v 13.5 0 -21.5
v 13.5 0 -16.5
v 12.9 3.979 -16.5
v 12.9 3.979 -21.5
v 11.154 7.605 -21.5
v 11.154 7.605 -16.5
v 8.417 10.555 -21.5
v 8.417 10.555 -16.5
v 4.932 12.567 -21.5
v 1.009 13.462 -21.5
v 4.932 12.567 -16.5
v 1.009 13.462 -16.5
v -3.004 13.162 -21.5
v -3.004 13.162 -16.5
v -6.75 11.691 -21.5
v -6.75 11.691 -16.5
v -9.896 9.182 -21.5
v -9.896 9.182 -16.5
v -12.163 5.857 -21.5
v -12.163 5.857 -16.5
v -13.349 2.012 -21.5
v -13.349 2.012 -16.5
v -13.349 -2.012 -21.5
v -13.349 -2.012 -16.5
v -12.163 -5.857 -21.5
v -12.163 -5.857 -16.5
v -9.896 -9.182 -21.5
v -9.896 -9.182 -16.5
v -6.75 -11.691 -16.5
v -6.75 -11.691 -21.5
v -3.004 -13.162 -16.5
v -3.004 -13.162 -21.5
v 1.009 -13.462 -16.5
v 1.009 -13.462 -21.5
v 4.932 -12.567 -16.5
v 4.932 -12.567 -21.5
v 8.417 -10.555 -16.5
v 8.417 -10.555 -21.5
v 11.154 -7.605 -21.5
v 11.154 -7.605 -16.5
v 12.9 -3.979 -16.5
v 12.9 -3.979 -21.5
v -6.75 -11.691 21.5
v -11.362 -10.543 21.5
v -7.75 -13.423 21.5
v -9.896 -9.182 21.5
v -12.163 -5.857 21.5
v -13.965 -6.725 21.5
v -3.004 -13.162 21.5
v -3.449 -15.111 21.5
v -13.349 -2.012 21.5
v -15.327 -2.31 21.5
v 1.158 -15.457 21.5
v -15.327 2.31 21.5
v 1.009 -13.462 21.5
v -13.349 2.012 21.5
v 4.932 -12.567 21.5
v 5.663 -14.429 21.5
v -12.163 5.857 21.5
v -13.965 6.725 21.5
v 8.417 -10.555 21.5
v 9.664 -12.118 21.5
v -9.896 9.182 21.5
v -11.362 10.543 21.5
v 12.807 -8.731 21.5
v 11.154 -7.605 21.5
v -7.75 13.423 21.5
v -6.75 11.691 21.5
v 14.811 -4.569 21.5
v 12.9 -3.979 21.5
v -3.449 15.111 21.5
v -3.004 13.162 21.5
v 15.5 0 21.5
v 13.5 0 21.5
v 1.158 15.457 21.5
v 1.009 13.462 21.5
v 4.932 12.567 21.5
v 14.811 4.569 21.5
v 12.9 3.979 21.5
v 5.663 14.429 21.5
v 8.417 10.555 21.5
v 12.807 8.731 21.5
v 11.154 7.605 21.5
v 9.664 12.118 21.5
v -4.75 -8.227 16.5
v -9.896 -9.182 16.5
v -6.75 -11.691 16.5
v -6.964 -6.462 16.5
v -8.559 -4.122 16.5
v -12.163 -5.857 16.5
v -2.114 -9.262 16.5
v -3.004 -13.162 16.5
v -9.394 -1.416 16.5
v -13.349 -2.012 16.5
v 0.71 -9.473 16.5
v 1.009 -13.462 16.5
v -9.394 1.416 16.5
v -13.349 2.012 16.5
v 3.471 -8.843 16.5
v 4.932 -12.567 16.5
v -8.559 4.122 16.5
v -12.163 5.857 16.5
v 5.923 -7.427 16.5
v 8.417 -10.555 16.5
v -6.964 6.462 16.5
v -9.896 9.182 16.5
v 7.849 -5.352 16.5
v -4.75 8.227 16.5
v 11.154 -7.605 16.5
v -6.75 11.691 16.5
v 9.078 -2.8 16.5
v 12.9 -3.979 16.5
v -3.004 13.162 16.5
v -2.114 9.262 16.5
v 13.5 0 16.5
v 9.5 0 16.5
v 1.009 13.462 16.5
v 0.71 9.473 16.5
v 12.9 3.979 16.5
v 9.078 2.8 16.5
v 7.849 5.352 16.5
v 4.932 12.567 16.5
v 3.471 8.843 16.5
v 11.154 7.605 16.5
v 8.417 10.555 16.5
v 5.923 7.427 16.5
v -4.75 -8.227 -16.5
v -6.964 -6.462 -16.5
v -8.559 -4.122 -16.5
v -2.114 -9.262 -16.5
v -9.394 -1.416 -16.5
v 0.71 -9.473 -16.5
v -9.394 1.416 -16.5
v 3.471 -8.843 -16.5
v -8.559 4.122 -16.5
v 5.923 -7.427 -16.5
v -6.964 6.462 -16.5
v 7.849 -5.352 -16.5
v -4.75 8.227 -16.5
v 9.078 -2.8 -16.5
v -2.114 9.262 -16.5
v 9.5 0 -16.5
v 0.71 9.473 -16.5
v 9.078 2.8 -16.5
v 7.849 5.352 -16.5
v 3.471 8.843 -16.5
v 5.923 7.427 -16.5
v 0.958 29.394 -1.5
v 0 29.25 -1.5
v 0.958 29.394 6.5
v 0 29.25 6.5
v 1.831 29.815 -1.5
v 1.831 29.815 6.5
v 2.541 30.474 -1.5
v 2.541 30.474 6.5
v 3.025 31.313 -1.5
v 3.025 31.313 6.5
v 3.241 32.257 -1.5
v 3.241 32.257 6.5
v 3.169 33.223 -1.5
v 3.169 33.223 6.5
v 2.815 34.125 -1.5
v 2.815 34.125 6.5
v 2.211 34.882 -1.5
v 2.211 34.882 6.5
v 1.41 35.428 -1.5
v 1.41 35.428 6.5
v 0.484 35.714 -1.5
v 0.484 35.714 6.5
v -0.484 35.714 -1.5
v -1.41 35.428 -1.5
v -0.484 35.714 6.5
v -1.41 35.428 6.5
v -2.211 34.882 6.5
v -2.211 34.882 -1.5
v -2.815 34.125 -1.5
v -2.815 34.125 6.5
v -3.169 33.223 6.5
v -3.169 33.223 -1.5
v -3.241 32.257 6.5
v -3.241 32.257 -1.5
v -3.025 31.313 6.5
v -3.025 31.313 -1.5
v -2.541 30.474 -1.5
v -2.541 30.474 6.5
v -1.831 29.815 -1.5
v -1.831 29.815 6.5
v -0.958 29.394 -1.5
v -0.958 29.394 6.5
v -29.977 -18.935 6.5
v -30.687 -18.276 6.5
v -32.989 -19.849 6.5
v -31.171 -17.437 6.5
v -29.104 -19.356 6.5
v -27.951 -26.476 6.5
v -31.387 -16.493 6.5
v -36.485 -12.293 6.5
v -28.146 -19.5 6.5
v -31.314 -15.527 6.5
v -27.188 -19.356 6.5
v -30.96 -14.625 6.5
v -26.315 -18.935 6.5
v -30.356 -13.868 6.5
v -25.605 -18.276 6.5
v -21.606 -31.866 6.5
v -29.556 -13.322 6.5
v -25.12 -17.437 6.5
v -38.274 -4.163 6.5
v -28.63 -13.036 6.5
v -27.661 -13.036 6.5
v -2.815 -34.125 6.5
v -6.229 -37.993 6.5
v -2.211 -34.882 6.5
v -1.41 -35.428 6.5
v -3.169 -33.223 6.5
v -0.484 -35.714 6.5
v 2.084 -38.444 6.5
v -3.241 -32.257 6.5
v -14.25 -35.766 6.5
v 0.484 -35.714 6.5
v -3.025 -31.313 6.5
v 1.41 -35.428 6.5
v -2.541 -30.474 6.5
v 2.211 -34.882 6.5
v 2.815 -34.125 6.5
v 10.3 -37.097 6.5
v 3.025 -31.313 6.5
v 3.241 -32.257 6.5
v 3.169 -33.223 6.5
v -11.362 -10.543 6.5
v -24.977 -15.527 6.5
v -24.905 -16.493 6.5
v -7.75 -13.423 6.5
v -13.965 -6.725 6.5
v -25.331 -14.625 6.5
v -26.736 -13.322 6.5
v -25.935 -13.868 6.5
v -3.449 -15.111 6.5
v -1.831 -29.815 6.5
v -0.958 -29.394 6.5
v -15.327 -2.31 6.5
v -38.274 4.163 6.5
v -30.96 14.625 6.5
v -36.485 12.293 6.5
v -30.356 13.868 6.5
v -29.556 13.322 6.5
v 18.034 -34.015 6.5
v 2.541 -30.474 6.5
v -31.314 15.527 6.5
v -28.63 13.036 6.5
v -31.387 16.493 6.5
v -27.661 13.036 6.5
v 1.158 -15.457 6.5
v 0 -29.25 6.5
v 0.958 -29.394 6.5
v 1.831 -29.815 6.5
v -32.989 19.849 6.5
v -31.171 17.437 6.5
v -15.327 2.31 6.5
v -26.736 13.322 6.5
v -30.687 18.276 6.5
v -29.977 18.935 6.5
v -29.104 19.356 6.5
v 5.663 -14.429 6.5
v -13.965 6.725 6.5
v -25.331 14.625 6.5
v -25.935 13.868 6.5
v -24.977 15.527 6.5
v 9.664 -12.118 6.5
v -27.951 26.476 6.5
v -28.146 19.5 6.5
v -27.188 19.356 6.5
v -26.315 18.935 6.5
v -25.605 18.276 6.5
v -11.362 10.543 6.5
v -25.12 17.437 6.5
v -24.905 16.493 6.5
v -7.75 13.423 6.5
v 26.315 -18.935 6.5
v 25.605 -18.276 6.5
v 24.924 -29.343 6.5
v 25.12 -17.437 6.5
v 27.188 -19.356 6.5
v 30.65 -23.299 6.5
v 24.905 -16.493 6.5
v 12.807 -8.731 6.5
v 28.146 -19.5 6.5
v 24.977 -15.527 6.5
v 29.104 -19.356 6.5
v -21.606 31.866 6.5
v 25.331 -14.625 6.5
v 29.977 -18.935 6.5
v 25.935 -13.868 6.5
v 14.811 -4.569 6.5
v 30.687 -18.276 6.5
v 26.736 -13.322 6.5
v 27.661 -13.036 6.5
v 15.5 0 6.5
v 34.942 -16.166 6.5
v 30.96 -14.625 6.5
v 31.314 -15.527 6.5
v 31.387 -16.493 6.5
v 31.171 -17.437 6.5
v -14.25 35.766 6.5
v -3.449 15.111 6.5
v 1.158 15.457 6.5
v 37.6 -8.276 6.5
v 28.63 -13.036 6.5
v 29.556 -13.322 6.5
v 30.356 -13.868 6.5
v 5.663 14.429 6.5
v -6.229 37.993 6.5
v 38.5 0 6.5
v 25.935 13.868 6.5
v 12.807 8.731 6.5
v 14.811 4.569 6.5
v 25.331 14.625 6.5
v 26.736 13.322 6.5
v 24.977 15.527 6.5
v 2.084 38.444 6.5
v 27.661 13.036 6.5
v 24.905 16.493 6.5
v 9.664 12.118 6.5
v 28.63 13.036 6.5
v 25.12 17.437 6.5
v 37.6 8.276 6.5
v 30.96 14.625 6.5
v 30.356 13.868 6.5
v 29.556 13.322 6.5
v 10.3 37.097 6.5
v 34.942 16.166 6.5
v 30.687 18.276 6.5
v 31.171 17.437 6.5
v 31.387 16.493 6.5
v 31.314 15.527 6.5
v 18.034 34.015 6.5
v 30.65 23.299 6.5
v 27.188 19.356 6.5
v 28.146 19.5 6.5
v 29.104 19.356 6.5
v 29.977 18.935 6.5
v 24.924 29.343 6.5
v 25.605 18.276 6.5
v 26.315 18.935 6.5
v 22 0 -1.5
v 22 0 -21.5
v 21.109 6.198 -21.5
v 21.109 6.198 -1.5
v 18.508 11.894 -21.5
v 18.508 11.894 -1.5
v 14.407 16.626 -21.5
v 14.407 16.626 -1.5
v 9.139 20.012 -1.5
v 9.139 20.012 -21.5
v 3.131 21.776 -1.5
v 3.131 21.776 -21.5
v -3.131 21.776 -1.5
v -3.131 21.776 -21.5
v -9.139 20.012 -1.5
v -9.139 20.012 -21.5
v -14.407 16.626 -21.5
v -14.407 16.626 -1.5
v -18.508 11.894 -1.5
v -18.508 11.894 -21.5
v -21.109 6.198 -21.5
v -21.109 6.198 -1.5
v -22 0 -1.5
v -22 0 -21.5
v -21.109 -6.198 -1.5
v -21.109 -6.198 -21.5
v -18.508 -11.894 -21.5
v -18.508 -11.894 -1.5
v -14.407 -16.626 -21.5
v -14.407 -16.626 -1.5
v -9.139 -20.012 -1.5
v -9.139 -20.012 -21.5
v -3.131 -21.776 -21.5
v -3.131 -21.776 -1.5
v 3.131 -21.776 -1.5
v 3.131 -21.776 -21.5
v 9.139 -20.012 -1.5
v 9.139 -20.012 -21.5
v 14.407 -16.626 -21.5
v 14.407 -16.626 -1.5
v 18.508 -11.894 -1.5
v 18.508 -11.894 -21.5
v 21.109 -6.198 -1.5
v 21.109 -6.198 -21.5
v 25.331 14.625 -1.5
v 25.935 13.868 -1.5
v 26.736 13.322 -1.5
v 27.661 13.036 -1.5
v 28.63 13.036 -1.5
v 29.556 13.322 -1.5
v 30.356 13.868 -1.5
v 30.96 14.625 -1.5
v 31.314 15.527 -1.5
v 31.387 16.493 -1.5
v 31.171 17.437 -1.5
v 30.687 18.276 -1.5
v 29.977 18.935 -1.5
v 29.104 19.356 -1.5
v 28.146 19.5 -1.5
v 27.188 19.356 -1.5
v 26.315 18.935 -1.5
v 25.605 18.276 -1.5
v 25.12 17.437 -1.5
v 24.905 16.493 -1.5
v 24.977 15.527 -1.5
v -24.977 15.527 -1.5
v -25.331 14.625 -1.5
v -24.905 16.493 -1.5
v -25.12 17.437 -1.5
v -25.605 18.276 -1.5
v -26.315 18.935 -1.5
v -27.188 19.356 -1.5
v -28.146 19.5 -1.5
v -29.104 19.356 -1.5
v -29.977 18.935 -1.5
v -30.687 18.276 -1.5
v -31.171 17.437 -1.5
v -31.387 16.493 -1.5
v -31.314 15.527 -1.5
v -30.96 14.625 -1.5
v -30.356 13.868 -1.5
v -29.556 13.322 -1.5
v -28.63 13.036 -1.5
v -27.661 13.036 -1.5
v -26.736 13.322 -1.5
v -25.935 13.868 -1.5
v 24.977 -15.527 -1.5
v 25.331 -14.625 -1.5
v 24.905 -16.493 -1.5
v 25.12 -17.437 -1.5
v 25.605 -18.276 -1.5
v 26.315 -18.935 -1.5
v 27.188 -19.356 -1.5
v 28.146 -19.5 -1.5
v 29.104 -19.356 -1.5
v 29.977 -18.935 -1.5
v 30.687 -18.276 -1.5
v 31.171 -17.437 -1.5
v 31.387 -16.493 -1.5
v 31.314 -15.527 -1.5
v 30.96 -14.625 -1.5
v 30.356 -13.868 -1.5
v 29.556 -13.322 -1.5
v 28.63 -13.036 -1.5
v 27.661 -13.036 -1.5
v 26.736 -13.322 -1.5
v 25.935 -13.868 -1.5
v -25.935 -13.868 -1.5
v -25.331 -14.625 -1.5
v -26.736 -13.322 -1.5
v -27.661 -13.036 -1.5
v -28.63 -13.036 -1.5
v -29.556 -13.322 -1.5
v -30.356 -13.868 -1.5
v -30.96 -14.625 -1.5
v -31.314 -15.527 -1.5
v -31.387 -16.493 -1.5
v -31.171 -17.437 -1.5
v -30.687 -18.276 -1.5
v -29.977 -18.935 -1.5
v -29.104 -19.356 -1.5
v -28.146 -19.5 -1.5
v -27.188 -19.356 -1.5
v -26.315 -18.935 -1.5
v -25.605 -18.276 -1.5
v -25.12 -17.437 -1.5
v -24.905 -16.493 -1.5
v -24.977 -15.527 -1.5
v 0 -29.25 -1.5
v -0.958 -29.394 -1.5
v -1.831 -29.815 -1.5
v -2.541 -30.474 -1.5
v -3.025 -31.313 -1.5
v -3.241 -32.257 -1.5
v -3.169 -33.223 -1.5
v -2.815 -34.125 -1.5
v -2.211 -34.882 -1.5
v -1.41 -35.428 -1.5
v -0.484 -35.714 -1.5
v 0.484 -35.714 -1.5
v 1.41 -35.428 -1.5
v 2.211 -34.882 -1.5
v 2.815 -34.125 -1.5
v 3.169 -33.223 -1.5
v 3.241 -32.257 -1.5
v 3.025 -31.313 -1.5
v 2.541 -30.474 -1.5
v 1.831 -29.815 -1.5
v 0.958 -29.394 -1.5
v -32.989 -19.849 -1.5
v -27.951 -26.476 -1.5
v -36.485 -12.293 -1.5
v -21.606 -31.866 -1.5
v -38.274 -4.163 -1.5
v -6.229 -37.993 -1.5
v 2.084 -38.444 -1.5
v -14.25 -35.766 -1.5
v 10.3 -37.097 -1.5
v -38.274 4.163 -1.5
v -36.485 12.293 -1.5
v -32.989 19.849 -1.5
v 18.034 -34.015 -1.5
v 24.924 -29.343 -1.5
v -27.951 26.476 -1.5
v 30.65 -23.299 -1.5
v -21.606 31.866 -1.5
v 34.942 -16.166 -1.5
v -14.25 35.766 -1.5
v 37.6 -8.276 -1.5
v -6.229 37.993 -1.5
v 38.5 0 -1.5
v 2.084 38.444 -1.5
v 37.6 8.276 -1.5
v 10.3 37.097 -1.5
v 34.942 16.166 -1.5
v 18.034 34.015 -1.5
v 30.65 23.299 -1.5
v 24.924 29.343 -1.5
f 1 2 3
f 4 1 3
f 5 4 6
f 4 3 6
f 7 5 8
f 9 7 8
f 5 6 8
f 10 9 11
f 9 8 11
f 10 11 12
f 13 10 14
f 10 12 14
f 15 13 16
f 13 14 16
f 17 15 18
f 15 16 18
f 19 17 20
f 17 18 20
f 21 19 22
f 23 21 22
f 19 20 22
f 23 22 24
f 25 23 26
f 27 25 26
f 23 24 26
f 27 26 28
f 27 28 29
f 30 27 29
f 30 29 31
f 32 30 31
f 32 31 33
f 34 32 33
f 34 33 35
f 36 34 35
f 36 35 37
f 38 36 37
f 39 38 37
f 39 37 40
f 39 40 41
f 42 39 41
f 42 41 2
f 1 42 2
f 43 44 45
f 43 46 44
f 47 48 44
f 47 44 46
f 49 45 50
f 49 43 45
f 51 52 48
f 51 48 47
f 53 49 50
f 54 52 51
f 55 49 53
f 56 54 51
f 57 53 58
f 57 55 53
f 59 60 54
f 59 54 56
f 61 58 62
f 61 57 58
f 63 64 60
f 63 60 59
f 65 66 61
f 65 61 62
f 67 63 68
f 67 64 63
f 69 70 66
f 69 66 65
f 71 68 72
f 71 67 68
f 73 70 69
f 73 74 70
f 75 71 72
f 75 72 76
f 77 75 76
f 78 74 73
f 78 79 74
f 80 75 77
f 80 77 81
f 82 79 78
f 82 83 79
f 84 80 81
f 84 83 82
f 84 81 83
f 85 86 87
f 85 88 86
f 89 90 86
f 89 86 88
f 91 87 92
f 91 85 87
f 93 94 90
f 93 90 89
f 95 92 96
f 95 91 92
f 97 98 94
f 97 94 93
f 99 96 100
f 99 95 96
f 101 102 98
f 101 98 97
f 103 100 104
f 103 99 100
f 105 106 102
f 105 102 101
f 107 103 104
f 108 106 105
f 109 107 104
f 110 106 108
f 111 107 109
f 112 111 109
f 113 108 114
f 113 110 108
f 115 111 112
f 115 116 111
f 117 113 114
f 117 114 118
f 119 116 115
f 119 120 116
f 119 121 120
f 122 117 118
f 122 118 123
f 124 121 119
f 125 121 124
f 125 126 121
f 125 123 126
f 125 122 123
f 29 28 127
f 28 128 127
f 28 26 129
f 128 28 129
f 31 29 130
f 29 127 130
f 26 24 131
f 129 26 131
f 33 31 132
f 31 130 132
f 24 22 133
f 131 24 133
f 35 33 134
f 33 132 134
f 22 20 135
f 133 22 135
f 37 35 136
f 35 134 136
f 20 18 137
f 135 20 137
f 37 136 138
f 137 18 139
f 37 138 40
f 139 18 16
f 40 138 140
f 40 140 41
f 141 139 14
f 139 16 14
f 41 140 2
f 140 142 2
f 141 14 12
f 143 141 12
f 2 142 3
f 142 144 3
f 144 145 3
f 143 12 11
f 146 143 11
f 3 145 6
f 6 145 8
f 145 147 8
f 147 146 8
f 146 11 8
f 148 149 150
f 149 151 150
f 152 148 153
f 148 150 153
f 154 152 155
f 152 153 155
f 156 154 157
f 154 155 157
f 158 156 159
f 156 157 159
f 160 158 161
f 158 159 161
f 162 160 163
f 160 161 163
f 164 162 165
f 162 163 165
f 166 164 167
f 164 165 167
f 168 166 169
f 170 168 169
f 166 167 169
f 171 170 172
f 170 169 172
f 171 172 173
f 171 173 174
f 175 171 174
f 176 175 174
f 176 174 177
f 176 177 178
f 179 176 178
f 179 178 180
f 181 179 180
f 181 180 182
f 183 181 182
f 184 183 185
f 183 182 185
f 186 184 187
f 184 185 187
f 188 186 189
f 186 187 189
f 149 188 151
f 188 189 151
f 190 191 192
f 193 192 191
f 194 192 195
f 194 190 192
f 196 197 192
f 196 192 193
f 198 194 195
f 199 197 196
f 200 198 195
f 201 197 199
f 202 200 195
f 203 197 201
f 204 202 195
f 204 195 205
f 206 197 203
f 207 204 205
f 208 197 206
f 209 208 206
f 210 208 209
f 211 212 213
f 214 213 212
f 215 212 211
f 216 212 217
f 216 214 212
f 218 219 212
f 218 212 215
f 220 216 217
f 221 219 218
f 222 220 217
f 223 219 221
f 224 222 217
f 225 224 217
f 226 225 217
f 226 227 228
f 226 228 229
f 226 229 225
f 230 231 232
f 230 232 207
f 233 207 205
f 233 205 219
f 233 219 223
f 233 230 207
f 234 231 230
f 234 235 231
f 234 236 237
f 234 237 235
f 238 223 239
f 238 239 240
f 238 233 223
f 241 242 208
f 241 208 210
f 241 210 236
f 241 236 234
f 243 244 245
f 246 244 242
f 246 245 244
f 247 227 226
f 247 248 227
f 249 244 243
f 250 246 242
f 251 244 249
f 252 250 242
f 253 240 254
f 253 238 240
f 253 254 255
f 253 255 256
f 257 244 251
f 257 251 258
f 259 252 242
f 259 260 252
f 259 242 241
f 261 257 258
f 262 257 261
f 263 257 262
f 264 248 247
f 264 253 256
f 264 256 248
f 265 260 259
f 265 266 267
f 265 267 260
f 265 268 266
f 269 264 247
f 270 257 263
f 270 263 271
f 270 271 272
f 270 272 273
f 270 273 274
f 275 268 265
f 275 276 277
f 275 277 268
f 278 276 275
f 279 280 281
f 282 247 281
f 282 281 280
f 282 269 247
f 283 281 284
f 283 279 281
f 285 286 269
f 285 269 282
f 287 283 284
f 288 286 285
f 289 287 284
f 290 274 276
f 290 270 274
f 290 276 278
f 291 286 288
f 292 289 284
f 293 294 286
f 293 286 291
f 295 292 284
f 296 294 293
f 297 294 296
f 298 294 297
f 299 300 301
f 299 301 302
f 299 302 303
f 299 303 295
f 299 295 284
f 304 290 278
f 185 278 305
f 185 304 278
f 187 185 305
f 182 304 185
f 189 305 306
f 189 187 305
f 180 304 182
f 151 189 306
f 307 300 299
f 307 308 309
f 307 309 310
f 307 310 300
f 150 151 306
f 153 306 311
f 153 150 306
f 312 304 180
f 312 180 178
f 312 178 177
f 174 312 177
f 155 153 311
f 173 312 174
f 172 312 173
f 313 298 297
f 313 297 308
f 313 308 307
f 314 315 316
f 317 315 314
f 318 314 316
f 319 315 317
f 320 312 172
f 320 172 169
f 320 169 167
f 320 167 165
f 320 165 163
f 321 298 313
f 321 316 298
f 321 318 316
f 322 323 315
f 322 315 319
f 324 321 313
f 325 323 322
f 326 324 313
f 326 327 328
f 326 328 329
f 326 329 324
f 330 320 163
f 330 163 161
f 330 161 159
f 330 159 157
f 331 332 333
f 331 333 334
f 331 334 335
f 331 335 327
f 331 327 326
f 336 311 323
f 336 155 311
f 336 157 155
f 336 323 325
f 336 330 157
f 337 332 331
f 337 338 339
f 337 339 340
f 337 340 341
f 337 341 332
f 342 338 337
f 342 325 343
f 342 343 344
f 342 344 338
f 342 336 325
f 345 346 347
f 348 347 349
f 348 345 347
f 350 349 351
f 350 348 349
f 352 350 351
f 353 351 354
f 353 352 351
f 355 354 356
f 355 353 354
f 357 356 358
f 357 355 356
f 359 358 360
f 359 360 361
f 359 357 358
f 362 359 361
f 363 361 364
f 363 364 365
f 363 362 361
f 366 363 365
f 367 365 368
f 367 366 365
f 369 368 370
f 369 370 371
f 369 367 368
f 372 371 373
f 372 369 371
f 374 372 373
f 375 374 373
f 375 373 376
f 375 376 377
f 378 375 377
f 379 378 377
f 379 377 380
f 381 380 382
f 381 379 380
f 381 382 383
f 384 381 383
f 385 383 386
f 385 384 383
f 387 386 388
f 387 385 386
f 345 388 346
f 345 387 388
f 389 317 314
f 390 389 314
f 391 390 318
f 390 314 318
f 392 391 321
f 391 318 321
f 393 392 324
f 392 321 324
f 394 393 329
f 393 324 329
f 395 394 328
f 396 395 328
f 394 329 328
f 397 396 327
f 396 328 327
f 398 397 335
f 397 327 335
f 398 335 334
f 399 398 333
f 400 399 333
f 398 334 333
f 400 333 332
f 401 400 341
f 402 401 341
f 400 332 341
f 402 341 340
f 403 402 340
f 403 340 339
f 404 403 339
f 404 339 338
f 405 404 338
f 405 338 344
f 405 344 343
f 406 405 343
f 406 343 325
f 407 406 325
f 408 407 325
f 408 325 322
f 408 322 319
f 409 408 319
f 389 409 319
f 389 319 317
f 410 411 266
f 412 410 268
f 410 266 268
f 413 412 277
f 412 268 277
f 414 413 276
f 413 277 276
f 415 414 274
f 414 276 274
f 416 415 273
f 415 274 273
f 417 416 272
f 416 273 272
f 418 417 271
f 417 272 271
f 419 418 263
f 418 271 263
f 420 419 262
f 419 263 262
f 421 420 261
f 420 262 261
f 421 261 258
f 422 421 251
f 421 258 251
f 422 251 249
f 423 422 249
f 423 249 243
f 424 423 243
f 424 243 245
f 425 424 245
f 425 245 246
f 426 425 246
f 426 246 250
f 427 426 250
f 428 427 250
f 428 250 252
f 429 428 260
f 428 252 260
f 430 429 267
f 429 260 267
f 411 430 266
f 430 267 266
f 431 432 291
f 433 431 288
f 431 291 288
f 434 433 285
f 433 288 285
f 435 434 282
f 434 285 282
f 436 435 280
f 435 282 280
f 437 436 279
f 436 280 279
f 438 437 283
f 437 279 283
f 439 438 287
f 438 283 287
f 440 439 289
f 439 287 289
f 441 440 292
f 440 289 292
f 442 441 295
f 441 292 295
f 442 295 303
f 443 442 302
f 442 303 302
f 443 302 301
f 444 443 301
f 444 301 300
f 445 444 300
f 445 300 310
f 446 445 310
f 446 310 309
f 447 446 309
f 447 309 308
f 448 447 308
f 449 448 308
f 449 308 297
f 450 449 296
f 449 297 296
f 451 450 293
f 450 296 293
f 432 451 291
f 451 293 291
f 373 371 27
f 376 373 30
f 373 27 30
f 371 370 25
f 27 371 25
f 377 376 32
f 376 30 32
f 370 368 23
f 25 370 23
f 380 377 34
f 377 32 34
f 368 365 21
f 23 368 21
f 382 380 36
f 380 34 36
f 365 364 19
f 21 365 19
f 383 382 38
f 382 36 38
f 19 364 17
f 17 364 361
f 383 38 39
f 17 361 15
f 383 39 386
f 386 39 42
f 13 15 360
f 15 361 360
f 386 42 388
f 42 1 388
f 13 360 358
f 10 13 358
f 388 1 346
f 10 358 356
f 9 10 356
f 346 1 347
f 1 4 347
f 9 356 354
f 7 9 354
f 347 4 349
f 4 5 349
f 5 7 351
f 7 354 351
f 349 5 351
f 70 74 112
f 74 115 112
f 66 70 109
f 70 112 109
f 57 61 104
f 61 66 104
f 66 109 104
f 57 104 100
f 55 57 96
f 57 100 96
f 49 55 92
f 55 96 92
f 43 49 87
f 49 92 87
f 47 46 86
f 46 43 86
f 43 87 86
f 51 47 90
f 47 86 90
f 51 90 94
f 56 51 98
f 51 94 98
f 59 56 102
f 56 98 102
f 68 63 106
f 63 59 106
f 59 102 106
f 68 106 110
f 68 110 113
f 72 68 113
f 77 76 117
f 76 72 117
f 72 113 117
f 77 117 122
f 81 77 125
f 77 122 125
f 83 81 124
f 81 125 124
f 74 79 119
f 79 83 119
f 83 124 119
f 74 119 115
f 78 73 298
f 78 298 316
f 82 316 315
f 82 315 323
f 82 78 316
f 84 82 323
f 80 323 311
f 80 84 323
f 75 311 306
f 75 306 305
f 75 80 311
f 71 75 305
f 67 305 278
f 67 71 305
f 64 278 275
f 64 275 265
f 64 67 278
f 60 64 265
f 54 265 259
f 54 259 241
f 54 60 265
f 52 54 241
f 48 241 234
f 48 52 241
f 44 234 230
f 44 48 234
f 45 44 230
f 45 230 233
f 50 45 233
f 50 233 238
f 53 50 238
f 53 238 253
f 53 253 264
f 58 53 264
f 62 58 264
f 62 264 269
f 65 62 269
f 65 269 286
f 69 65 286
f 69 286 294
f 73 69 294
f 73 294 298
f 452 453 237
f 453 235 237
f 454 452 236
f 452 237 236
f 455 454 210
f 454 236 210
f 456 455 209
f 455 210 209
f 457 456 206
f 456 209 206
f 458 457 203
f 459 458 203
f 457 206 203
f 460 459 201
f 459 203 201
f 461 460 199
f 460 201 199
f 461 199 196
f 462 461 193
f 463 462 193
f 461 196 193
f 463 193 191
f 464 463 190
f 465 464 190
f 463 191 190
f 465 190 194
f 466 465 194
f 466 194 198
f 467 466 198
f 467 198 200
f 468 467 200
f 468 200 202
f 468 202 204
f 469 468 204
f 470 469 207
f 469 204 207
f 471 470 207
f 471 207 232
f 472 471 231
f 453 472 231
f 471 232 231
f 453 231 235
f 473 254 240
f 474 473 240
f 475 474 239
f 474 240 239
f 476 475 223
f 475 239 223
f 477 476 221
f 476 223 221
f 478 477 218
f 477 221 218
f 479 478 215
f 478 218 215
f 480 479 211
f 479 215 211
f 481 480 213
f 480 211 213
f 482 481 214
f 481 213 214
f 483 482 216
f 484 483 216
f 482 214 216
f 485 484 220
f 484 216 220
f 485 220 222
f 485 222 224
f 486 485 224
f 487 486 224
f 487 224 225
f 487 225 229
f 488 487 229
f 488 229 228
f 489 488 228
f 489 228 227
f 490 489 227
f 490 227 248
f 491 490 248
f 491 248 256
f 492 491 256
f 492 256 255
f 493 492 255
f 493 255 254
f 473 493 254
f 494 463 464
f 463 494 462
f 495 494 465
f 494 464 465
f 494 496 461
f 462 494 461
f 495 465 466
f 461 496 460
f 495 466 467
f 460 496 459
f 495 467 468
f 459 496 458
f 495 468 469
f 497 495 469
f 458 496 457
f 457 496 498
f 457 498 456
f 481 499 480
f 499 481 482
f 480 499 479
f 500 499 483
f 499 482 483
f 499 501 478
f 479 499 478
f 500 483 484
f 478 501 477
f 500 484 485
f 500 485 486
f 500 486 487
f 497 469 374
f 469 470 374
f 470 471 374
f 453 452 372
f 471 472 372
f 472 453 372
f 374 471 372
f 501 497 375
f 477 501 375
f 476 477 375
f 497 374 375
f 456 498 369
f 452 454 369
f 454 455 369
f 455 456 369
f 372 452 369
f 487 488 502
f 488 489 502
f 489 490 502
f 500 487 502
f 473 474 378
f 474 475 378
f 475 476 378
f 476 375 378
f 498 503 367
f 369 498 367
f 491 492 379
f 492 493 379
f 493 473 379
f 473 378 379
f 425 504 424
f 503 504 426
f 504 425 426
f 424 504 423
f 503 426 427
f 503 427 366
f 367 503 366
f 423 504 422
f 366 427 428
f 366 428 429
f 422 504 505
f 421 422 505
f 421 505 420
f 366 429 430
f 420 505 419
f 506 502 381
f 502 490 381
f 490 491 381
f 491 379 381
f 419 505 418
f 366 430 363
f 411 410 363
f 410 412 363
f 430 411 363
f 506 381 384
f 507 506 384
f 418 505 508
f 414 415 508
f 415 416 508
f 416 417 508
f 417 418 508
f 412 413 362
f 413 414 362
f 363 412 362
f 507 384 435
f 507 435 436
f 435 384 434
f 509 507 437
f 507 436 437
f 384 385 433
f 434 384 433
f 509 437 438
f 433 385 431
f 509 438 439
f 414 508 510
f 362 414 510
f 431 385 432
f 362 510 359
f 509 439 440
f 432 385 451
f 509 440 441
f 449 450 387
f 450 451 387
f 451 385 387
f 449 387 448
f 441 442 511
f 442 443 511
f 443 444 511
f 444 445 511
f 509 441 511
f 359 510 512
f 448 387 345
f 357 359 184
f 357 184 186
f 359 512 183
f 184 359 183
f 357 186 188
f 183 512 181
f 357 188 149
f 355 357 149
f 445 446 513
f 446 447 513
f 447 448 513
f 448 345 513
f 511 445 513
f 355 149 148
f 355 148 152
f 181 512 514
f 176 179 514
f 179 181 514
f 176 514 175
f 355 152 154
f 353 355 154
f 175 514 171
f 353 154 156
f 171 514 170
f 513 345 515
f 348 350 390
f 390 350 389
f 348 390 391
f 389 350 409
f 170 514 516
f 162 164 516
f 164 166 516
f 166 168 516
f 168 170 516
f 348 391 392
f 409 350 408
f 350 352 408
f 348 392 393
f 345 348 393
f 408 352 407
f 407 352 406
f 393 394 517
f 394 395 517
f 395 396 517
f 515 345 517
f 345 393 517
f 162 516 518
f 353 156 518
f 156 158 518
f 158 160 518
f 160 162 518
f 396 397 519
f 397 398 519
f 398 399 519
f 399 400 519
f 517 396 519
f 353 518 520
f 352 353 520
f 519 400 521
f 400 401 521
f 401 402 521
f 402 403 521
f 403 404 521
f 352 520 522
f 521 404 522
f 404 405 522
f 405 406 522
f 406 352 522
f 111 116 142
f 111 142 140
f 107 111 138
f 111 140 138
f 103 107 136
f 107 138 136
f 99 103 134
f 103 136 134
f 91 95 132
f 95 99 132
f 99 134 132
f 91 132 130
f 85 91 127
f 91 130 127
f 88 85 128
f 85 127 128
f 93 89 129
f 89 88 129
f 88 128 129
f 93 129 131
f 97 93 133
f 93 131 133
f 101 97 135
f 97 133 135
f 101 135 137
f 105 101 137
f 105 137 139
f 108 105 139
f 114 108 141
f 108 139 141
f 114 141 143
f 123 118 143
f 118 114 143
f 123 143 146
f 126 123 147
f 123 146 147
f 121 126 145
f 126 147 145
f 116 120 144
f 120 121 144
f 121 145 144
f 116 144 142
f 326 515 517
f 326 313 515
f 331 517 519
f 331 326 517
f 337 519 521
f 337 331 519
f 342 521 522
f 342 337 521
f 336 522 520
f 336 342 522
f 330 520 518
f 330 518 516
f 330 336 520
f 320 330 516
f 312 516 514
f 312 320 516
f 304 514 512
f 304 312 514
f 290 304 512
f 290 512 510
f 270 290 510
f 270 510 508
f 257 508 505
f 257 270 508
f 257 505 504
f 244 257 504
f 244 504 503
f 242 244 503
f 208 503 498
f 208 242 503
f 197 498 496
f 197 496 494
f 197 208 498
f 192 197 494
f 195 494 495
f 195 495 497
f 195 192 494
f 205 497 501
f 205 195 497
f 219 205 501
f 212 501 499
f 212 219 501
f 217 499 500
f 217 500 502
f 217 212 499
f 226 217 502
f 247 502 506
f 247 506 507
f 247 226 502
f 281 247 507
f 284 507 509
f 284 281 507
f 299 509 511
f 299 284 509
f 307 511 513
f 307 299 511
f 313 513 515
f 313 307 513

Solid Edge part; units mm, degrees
sketch "Sketch1" plane through (0, 0, 0) normal (0, -1, 0) x (1, 0, 0)
  line L0 (9.5, 16.5) -> (9.5, -16.5)
  line L1 (13.5, -16.5) -> (9.5, -16.5)
  line L2 (13.5, -21.5) -> (13.5, -16.5)
  line L3 (22, -21.5) -> (13.5, -21.5)
  line L4 (22, -21.5) -> (22, -1.5)
  line L5 (22, -1.5) -> (38.5, -1.5)
  line L6 (38.5, -1.5) -> (38.5, 6.5)
  line L7 (38.5, 6.5) -> (15.5, 6.5)
  line L8 (15.5, 6.5) -> (15.5, 21.5)
  line L9 (15.5, 21.5) -> (13.5, 21.5)
  line L10 (13.5, 21.5) -> (13.5, 16.5)
  line L11 (13.5, 16.5) -> (9.5, 16.5)
  dimension "D1" = 8
  dimension "D2" = 15
  dimension "D3" = 9.5
  dimension "D4" = 13.5
  dimension "D5" = 15.5
  dimension "D6" = 38.5
  dimension "D7" = 22
  dimension "D8" = 43
  dimension "D9" = 5
  dimension "D10" = 13.5
  dimension "D11" = 5
revolve "RevolvedProtrusion1" add sketch "Sketch1" angle 360 about axis through (0, 0, 0) along (0, 0, 1)
hole "Hole1" at (0, 32.5, 6.5) direction (0, 0, -1) diameter 6.5 end up to next
pattern_circular "Pattern1" count 6 over 360 about axis through (0, 0, 6.5) along (0, 0, -1) of "Hole1"
properties part number "1976-1200-007" material "Aluminio, 7075-T6"
